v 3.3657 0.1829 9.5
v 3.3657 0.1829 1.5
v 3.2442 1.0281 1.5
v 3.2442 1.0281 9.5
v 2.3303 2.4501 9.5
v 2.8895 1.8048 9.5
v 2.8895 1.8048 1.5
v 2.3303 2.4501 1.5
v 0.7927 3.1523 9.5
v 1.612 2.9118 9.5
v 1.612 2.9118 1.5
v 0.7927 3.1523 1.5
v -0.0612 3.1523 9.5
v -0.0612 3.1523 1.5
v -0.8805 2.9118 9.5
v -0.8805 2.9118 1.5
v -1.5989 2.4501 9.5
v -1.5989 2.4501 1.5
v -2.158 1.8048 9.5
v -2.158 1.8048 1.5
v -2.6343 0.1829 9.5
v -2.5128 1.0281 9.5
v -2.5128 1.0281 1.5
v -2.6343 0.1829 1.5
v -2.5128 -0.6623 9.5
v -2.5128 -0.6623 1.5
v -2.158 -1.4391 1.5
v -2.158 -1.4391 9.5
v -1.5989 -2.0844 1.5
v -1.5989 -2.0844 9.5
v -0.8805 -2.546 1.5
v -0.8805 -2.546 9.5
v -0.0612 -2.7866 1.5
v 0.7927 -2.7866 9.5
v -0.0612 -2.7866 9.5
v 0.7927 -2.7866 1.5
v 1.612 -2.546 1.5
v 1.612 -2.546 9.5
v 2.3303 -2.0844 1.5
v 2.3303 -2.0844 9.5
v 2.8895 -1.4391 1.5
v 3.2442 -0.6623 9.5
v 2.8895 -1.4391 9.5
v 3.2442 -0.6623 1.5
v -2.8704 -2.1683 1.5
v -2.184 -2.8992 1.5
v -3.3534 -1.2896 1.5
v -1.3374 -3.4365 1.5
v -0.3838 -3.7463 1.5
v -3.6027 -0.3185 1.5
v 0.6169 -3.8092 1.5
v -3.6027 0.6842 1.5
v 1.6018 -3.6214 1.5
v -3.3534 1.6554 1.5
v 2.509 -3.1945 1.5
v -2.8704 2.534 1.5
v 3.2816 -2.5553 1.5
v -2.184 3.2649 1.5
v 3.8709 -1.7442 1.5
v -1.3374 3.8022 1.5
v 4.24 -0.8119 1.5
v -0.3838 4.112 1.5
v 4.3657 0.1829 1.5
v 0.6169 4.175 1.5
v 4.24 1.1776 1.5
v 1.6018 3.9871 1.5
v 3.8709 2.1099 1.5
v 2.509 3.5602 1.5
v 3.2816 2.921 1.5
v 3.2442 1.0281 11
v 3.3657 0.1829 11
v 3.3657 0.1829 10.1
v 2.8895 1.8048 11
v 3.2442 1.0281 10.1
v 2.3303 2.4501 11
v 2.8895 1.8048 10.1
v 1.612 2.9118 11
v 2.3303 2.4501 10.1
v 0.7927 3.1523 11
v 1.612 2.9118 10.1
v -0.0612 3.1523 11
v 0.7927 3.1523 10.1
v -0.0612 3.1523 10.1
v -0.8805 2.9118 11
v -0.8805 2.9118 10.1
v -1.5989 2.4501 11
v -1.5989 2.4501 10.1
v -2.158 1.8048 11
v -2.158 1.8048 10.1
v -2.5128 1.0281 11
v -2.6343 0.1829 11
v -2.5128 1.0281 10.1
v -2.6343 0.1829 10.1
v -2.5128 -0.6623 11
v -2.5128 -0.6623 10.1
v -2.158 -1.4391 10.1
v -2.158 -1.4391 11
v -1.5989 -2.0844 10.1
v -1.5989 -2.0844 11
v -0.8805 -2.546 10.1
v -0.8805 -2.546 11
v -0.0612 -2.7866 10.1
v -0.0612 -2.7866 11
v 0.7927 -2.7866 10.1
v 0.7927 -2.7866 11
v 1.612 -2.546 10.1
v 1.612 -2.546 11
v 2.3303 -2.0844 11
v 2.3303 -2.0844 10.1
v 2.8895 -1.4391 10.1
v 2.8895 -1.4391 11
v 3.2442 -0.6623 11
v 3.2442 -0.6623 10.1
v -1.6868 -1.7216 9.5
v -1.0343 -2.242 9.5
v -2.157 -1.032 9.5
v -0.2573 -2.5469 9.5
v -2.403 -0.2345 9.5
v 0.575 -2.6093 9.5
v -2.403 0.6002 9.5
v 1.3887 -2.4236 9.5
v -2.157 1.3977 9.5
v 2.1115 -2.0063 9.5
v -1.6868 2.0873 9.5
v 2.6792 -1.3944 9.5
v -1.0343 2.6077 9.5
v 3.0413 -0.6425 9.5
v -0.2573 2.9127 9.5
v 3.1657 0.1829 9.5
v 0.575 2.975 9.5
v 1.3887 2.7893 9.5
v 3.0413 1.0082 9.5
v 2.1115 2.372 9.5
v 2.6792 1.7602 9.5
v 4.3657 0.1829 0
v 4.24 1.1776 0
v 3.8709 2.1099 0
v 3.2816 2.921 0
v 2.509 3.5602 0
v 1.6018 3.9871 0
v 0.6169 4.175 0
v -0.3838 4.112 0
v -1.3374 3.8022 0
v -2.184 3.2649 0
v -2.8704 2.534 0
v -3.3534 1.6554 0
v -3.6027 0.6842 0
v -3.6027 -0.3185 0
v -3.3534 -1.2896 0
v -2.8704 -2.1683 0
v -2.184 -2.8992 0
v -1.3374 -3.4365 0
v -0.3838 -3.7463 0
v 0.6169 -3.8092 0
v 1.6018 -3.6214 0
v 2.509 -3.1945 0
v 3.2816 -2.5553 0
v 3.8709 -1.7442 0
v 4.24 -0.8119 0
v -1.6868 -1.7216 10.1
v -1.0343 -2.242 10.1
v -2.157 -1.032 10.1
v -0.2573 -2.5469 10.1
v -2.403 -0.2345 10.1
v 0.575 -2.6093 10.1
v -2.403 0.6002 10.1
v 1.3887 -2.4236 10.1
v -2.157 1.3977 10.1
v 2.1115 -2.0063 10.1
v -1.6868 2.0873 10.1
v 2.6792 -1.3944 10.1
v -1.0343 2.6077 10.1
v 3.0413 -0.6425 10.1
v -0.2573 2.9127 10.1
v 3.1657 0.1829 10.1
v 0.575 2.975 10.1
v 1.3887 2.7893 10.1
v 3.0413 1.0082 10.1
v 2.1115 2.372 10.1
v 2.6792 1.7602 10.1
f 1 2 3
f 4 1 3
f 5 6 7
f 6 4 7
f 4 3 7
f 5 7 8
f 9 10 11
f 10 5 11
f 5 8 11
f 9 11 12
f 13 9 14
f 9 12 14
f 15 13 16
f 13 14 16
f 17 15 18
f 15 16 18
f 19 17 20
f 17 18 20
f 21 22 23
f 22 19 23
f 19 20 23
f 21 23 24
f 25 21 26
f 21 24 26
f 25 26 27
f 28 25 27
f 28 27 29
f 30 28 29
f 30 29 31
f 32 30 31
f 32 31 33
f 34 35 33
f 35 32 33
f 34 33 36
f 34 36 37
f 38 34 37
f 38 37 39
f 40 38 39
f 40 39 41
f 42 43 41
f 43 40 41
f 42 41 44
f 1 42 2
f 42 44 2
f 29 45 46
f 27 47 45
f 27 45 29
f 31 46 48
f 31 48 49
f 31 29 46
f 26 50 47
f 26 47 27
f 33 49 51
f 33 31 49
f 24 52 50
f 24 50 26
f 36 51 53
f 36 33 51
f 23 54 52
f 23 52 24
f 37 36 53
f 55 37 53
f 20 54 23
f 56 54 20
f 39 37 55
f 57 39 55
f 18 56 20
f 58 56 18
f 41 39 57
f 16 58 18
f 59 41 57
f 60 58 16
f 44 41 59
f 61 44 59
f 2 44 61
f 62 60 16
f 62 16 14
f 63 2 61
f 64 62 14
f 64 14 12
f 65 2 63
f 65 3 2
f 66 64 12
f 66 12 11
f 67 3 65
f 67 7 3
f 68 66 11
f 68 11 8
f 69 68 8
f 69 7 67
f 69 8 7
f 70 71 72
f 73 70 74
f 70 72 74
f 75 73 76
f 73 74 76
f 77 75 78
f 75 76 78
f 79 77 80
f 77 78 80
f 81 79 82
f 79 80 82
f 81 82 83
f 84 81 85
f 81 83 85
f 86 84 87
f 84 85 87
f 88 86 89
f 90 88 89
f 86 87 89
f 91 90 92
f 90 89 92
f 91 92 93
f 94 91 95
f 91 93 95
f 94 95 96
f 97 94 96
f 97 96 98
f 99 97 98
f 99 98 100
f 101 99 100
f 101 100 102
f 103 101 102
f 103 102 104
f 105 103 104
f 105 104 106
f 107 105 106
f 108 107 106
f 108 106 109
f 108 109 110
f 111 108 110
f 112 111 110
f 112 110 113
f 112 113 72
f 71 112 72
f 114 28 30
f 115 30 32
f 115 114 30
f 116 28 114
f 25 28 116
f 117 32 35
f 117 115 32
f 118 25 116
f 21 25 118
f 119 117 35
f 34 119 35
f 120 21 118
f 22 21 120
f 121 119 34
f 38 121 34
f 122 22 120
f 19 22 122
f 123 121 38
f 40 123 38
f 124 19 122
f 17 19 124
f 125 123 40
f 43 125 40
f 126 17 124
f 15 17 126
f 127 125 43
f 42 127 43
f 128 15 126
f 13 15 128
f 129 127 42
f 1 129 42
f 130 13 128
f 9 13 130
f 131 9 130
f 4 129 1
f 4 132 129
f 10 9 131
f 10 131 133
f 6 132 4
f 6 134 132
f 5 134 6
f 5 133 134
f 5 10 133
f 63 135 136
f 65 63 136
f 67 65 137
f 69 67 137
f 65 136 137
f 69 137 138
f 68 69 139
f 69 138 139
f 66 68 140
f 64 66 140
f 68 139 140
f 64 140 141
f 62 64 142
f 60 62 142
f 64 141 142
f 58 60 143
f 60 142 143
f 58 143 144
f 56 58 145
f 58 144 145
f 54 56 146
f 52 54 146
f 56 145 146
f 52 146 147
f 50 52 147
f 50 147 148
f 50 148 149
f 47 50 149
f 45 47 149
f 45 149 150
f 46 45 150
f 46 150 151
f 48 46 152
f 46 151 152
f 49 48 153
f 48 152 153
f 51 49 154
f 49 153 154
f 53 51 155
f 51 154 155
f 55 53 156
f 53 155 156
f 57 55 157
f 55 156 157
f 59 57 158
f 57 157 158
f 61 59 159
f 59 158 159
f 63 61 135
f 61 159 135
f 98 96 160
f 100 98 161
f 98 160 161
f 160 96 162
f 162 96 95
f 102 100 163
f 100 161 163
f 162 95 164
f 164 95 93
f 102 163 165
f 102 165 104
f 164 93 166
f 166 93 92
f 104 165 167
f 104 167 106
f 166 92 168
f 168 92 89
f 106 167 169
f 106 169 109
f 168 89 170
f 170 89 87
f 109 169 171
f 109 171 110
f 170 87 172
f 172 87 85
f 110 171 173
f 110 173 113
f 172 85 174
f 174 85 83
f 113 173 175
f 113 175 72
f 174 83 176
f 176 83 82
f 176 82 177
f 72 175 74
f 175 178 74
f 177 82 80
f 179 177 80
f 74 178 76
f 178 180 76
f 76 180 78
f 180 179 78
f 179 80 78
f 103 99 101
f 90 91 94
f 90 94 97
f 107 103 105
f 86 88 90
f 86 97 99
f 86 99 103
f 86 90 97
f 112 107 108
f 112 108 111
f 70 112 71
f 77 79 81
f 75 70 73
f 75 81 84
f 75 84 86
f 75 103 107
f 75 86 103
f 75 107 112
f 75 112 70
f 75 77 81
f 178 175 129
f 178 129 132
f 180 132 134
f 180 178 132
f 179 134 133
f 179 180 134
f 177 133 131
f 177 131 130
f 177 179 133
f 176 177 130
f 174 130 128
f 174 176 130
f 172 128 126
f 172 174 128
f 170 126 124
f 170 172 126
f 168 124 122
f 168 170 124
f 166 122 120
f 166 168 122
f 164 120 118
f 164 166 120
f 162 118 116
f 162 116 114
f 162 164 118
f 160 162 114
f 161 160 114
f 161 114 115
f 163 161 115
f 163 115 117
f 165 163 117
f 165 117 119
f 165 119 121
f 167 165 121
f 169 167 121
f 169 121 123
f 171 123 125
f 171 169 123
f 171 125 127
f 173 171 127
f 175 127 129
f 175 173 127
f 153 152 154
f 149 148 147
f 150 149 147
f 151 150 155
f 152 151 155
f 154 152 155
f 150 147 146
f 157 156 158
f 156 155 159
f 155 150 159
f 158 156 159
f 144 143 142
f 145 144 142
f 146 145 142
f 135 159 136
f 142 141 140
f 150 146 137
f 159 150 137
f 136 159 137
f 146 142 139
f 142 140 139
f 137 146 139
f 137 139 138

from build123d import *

# Parameters (mm, degrees)
SKETCH_1_R           = 4
EXTRUDE_1_DEPTH      = 1.5
SKETCH_1_3_R         = 3
EXTRUDE_2_DEPTH      = 11
CUT_EXTRUDE_START    = 10.1
SKETCH_1_4_OUTSIDE_W = 13.156
SKETCH_1_4_OUTSIDE_H = 13.156
SKETCH_1_4_OUTSIDE_R = 2.8
CUT_EXTRUDE_1_DEPTH  = 0.6


with BuildPart() as part:
    # 草图1 → 凸台-拉伸1 (new body)
    with BuildSketch(Plane.XY):
        with Locations((0.365715483, 0.182857742)):
            Circle(SKETCH_1_R)
    extrude(amount=EXTRUDE_1_DEPTH)

    # 草图1<3> → 凸台-拉伸2 (add)
    with BuildSketch(Plane.XY):
        with Locations((0.365715483, 0.182857742)):
            Circle(SKETCH_1_3_R)
    extrude(amount=EXTRUDE_2_DEPTH)

    # 草图1<4> outside → 切除-拉伸1 (cut)
    with BuildSketch(Plane.XY.offset(CUT_EXTRUDE_START)):
        with Locations((0.366, 0.183)):
            Rectangle(SKETCH_1_4_OUTSIDE_W, SKETCH_1_4_OUTSIDE_H)
        with Locations((0.365715483, 0.182857742)):
            Circle(SKETCH_1_4_OUTSIDE_R, mode=Mode.SUBTRACT)
    extrude(amount=-CUT_EXTRUDE_1_DEPTH, mode=Mode.SUBTRACT)


solid = part.part
